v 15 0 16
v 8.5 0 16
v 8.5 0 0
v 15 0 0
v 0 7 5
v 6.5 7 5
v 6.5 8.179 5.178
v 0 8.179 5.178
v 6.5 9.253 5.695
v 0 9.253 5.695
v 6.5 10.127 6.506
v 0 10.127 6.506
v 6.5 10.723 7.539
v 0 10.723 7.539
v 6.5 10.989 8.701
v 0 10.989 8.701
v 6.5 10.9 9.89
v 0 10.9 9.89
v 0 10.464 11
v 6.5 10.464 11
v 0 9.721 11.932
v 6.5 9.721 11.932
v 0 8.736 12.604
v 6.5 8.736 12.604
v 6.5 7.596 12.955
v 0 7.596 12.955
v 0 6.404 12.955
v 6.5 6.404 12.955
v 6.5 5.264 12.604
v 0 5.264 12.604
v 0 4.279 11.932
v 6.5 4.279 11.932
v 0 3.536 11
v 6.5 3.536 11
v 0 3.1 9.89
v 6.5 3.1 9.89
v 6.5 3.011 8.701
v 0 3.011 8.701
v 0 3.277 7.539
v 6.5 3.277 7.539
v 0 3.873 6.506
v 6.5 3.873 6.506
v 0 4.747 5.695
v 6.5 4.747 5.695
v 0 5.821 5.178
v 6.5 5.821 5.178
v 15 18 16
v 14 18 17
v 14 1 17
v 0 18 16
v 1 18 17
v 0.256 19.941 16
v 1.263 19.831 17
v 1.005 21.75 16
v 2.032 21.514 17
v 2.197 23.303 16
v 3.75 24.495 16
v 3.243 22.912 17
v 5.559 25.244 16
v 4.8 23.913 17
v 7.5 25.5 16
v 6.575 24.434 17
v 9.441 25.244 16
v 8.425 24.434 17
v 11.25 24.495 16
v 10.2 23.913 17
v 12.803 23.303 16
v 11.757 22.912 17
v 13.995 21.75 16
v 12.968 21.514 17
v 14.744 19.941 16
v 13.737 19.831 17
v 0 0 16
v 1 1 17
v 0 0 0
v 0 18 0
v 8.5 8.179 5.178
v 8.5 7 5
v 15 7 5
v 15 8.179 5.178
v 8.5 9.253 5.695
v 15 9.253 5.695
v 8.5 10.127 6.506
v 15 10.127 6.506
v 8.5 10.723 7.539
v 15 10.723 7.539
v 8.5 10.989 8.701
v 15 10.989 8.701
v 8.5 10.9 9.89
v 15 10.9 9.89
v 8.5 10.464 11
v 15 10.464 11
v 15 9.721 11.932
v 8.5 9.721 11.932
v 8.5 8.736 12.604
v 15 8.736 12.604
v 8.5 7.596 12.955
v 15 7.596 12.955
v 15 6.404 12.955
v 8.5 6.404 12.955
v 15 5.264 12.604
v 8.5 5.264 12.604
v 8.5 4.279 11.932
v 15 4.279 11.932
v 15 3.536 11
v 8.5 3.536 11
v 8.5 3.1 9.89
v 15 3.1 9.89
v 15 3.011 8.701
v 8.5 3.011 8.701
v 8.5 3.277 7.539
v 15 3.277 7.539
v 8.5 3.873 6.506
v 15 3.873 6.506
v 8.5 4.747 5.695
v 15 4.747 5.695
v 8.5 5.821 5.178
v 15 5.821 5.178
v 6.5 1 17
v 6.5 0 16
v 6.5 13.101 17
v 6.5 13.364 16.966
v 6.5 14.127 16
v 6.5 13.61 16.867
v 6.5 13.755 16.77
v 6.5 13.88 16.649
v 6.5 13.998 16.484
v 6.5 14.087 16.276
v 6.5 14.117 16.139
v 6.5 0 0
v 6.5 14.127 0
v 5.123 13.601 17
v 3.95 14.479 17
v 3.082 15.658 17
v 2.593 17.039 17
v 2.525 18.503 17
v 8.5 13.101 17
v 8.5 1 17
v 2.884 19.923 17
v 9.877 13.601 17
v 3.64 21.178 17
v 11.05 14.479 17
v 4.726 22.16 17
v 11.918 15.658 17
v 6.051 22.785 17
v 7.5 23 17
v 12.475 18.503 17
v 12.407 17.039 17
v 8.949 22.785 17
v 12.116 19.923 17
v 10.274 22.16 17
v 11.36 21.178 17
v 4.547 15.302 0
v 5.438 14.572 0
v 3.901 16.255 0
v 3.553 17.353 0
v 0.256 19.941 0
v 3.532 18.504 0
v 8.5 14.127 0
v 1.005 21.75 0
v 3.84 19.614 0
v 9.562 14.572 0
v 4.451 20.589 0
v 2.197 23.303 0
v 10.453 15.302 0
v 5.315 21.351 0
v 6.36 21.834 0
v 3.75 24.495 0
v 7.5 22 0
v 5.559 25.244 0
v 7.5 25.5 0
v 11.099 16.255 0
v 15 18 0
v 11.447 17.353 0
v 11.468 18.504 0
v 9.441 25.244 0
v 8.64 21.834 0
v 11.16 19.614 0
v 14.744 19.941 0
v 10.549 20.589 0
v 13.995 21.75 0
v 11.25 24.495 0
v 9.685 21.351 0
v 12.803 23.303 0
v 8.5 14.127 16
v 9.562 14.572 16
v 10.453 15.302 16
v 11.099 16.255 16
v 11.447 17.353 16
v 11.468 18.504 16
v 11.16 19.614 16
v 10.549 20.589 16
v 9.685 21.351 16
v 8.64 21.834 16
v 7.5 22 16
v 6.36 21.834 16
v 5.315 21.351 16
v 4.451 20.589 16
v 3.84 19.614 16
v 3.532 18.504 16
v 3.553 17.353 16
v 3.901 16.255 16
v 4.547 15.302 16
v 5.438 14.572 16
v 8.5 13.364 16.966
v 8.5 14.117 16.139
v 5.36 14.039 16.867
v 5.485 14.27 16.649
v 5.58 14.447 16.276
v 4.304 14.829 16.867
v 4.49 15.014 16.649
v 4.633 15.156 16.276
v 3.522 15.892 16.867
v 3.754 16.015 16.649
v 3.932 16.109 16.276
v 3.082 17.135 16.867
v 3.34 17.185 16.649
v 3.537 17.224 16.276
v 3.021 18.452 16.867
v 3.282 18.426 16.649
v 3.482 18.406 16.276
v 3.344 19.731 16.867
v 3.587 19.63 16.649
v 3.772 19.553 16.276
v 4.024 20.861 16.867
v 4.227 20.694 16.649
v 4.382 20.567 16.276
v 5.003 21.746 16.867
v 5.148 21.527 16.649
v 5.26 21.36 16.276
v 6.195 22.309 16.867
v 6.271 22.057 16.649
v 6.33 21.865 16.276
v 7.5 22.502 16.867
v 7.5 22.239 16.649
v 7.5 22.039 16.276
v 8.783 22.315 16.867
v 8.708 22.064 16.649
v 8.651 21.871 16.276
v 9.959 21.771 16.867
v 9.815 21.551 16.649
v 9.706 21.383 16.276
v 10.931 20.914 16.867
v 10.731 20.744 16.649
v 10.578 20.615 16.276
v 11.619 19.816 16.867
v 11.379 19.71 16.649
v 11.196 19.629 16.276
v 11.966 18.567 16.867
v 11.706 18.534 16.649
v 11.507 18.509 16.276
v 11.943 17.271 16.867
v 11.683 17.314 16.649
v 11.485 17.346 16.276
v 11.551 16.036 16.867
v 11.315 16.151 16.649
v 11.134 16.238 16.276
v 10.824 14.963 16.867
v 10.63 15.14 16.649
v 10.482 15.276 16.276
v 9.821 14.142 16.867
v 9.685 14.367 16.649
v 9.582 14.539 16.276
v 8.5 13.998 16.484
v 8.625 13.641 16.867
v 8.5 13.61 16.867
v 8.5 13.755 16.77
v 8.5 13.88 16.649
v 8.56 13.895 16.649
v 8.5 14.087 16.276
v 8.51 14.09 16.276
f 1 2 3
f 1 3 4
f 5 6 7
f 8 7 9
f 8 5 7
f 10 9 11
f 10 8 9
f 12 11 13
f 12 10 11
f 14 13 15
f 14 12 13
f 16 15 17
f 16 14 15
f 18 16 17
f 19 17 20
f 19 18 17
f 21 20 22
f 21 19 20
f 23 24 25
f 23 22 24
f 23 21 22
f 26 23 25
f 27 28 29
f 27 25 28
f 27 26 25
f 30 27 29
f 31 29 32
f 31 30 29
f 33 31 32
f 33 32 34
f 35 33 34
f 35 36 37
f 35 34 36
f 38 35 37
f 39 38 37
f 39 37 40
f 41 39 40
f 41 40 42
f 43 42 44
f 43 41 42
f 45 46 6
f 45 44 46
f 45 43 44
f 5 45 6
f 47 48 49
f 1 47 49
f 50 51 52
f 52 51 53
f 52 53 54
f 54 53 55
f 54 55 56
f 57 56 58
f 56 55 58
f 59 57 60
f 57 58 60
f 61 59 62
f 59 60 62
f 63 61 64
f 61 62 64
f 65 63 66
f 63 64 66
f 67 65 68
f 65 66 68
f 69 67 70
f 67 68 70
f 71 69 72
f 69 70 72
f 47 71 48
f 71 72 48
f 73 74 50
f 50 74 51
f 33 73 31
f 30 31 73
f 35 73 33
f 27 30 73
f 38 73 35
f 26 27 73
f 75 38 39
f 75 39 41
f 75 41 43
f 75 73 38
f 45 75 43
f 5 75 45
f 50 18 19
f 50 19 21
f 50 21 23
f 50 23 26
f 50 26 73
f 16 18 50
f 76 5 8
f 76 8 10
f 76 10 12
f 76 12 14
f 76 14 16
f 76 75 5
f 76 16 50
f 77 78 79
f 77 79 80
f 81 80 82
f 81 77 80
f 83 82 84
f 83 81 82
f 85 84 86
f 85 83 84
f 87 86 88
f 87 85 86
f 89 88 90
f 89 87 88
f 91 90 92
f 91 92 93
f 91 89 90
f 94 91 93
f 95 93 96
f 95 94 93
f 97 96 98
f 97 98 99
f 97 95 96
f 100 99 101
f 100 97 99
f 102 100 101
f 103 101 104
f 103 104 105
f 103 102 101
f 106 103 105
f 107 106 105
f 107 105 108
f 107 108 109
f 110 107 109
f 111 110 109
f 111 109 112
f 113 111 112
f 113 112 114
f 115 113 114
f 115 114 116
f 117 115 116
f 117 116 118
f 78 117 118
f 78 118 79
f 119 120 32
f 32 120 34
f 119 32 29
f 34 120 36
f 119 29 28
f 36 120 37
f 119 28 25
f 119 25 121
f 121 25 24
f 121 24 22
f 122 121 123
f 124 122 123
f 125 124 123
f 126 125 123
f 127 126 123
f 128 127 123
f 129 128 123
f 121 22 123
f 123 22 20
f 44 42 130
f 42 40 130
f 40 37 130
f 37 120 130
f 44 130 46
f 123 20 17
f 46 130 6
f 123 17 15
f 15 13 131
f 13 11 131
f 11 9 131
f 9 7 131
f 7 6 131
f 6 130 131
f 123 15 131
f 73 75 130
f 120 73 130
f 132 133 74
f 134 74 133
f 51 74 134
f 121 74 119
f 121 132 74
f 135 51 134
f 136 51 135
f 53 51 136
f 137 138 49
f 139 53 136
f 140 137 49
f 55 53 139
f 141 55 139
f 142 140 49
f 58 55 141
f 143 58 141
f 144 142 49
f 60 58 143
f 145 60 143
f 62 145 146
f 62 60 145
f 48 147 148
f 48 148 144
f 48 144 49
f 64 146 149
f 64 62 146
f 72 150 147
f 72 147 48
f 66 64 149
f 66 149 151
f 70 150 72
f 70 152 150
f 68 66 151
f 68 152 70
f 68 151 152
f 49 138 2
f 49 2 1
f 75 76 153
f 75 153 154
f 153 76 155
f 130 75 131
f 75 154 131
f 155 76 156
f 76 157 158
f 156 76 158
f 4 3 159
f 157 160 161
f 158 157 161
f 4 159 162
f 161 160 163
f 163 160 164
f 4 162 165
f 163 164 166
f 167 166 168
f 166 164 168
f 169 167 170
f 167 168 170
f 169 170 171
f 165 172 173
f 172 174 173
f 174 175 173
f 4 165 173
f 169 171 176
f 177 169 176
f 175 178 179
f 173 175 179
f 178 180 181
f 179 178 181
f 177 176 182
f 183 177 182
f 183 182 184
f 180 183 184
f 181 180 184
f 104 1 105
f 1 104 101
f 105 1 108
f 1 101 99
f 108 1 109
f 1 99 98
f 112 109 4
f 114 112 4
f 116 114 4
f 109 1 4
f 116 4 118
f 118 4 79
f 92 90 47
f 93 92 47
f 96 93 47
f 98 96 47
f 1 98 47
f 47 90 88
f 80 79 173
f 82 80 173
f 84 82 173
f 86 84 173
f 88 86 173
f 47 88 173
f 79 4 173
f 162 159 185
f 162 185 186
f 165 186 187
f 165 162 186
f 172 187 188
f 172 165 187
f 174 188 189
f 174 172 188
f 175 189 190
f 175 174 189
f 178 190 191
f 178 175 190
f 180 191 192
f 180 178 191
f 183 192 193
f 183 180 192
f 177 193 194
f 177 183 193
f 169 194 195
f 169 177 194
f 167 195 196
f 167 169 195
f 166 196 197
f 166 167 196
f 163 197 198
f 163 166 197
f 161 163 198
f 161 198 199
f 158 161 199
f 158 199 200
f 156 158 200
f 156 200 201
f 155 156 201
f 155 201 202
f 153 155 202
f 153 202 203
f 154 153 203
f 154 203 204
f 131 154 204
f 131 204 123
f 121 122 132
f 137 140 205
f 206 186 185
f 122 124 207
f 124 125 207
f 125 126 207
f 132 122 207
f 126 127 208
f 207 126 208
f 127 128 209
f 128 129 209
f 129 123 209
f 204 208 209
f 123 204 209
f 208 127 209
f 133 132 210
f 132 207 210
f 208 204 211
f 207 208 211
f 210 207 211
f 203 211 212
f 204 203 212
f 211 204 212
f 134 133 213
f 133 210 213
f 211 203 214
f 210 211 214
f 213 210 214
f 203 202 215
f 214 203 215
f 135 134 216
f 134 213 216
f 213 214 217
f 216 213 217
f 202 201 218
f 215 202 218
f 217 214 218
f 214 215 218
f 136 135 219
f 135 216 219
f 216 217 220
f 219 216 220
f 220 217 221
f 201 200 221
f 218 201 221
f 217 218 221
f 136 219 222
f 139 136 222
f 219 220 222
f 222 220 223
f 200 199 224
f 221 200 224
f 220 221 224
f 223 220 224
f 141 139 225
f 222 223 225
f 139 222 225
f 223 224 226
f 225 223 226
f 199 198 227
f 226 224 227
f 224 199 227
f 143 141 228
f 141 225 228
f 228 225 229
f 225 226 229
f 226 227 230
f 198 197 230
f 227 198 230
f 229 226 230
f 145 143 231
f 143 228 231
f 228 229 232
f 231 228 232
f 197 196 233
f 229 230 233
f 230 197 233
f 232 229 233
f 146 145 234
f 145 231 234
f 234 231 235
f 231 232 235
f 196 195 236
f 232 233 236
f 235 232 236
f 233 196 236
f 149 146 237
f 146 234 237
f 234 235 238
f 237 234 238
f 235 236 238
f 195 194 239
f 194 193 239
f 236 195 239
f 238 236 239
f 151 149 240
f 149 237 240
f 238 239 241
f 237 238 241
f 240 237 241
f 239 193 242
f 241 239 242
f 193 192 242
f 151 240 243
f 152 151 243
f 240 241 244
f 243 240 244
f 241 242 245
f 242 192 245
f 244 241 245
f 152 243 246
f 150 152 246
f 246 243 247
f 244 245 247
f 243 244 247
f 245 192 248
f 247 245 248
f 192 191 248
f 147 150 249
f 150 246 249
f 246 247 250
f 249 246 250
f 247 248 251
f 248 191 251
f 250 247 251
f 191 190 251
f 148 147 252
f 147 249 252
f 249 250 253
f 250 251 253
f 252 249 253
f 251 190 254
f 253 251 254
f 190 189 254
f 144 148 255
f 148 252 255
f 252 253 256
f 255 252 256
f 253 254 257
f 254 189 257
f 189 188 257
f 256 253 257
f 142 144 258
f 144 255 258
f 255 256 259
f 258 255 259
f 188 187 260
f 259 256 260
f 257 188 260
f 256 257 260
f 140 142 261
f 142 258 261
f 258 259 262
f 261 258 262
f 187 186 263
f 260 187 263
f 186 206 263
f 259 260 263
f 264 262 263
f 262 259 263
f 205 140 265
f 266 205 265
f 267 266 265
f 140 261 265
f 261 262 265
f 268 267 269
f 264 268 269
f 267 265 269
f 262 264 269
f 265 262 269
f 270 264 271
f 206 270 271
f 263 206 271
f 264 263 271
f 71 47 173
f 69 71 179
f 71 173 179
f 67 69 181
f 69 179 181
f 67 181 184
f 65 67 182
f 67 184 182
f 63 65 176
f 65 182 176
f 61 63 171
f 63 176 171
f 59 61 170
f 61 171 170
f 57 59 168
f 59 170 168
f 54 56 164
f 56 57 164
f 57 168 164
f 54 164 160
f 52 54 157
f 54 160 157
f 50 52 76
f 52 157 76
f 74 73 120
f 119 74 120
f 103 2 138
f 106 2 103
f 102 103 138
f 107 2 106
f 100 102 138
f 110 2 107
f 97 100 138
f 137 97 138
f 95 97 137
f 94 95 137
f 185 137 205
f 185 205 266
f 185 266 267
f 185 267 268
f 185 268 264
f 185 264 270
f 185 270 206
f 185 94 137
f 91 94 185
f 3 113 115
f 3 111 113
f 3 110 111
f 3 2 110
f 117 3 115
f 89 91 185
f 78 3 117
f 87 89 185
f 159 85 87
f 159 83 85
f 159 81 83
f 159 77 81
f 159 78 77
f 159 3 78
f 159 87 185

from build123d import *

# Parameters (mm, degrees)
BOX001_W                = 2
BOX001_H                = 17
BOX001_DEPTH            = 17
CYLINDER002_R           = 4
CYLINDER002_DEPTH       = 15
CYLINDER002_PITCH_ANGLE = 90
CYLINDER001_R           = 4
CYLINDER001_DEPTH       = 17
BOX_W                   = 15
BOX_H                   = 18
BOX_DEPTH               = 17
CYLINDER_R              = 7.5
CYLINDER_DEPTH          = 17
CHAMFER_SIZE            = 1
FILLET_R                = 1


with BuildPart() as box001:
    # Box001 → Box001 (new body)
    with BuildSketch(Plane(origin=(6.5, 0, 0), x_dir=(1, 0, 0), z_dir=(0, 0, 1))):
        with Locations((1, 8.5)):
            Rectangle(BOX001_W, BOX001_H)
    extrude(amount=BOX001_DEPTH)


with BuildPart() as cylinder002:
    # Cylinder002 → Cylinder002 (new body)
    with BuildSketch(Plane.XY):
        Circle(CYLINDER002_R)
    extrude(amount=CYLINDER002_DEPTH)


with BuildPart() as cylinder002_1:
    # Cylinder002 pitch: moved
    add(cylinder002.part.rotate(Axis((0, 0, 0), (0, 1, 0)), CYLINDER002_PITCH_ANGLE))


with BuildPart() as cylinder002_2:
    # Cylinder002 placement: moved
    add(cylinder002_1.part.moved(Location((0, 7, 9))))


with BuildPart() as cylinder001:
    # Cylinder001 → Cylinder001 (new body)
    with BuildSketch(Plane(origin=(7.5, 18, 0), x_dir=(1, 0, 0), z_dir=(0, 0, 1))):
        Circle(CYLINDER001_R)
    extrude(amount=CYLINDER001_DEPTH)


with BuildPart() as box:
    # Box → Box (new body)
    with BuildSketch(Plane.XY):
        with Locations((7.5, 9)):
            Rectangle(BOX_W, BOX_H)
    extrude(amount=BOX_DEPTH)


with BuildPart() as fillet_body:
    # Cylinder → Cylinder (new body)
    with BuildSketch(Plane(origin=(7.5, 18, 0), x_dir=(1, 0, 0), z_dir=(0, 0, 1))):
        Circle(CYLINDER_R)
    extrude(amount=CYLINDER_DEPTH)

    # Fusion: union Box
    add(box.part)

    # Cut: cut Cylinder001
    add(cylinder001.part, mode=Mode.SUBTRACT)

    # Cut001: cut Cylinder002
    add(cylinder002_2.part, mode=Mode.SUBTRACT)

    # Cut002: cut Box001
    add(box001.part, mode=Mode.SUBTRACT)

    # Chamfer
    chamfer_edges = [fillet_body.edges().sort_by_distance(p)[0] for p in [
        (3.25, 0, 17),
        (0, 9, 17),
        (7.5, 25.5, 17),
        (15, 9, 17),
        (11.75, 0, 17),
    ]]
    chamfer(chamfer_edges, length=CHAMFER_SIZE)

    # Fillet
    fillet_edges = [fillet_body.edges().sort_by_distance(p)[0] for p in [
        (4.337722, 15.55051, 17),
        (7.5, 22, 17),
        (10.662278, 15.55051, 17),
    ]]
    fillet(fillet_edges, radius=FILLET_R)


solid = fillet_body.part
